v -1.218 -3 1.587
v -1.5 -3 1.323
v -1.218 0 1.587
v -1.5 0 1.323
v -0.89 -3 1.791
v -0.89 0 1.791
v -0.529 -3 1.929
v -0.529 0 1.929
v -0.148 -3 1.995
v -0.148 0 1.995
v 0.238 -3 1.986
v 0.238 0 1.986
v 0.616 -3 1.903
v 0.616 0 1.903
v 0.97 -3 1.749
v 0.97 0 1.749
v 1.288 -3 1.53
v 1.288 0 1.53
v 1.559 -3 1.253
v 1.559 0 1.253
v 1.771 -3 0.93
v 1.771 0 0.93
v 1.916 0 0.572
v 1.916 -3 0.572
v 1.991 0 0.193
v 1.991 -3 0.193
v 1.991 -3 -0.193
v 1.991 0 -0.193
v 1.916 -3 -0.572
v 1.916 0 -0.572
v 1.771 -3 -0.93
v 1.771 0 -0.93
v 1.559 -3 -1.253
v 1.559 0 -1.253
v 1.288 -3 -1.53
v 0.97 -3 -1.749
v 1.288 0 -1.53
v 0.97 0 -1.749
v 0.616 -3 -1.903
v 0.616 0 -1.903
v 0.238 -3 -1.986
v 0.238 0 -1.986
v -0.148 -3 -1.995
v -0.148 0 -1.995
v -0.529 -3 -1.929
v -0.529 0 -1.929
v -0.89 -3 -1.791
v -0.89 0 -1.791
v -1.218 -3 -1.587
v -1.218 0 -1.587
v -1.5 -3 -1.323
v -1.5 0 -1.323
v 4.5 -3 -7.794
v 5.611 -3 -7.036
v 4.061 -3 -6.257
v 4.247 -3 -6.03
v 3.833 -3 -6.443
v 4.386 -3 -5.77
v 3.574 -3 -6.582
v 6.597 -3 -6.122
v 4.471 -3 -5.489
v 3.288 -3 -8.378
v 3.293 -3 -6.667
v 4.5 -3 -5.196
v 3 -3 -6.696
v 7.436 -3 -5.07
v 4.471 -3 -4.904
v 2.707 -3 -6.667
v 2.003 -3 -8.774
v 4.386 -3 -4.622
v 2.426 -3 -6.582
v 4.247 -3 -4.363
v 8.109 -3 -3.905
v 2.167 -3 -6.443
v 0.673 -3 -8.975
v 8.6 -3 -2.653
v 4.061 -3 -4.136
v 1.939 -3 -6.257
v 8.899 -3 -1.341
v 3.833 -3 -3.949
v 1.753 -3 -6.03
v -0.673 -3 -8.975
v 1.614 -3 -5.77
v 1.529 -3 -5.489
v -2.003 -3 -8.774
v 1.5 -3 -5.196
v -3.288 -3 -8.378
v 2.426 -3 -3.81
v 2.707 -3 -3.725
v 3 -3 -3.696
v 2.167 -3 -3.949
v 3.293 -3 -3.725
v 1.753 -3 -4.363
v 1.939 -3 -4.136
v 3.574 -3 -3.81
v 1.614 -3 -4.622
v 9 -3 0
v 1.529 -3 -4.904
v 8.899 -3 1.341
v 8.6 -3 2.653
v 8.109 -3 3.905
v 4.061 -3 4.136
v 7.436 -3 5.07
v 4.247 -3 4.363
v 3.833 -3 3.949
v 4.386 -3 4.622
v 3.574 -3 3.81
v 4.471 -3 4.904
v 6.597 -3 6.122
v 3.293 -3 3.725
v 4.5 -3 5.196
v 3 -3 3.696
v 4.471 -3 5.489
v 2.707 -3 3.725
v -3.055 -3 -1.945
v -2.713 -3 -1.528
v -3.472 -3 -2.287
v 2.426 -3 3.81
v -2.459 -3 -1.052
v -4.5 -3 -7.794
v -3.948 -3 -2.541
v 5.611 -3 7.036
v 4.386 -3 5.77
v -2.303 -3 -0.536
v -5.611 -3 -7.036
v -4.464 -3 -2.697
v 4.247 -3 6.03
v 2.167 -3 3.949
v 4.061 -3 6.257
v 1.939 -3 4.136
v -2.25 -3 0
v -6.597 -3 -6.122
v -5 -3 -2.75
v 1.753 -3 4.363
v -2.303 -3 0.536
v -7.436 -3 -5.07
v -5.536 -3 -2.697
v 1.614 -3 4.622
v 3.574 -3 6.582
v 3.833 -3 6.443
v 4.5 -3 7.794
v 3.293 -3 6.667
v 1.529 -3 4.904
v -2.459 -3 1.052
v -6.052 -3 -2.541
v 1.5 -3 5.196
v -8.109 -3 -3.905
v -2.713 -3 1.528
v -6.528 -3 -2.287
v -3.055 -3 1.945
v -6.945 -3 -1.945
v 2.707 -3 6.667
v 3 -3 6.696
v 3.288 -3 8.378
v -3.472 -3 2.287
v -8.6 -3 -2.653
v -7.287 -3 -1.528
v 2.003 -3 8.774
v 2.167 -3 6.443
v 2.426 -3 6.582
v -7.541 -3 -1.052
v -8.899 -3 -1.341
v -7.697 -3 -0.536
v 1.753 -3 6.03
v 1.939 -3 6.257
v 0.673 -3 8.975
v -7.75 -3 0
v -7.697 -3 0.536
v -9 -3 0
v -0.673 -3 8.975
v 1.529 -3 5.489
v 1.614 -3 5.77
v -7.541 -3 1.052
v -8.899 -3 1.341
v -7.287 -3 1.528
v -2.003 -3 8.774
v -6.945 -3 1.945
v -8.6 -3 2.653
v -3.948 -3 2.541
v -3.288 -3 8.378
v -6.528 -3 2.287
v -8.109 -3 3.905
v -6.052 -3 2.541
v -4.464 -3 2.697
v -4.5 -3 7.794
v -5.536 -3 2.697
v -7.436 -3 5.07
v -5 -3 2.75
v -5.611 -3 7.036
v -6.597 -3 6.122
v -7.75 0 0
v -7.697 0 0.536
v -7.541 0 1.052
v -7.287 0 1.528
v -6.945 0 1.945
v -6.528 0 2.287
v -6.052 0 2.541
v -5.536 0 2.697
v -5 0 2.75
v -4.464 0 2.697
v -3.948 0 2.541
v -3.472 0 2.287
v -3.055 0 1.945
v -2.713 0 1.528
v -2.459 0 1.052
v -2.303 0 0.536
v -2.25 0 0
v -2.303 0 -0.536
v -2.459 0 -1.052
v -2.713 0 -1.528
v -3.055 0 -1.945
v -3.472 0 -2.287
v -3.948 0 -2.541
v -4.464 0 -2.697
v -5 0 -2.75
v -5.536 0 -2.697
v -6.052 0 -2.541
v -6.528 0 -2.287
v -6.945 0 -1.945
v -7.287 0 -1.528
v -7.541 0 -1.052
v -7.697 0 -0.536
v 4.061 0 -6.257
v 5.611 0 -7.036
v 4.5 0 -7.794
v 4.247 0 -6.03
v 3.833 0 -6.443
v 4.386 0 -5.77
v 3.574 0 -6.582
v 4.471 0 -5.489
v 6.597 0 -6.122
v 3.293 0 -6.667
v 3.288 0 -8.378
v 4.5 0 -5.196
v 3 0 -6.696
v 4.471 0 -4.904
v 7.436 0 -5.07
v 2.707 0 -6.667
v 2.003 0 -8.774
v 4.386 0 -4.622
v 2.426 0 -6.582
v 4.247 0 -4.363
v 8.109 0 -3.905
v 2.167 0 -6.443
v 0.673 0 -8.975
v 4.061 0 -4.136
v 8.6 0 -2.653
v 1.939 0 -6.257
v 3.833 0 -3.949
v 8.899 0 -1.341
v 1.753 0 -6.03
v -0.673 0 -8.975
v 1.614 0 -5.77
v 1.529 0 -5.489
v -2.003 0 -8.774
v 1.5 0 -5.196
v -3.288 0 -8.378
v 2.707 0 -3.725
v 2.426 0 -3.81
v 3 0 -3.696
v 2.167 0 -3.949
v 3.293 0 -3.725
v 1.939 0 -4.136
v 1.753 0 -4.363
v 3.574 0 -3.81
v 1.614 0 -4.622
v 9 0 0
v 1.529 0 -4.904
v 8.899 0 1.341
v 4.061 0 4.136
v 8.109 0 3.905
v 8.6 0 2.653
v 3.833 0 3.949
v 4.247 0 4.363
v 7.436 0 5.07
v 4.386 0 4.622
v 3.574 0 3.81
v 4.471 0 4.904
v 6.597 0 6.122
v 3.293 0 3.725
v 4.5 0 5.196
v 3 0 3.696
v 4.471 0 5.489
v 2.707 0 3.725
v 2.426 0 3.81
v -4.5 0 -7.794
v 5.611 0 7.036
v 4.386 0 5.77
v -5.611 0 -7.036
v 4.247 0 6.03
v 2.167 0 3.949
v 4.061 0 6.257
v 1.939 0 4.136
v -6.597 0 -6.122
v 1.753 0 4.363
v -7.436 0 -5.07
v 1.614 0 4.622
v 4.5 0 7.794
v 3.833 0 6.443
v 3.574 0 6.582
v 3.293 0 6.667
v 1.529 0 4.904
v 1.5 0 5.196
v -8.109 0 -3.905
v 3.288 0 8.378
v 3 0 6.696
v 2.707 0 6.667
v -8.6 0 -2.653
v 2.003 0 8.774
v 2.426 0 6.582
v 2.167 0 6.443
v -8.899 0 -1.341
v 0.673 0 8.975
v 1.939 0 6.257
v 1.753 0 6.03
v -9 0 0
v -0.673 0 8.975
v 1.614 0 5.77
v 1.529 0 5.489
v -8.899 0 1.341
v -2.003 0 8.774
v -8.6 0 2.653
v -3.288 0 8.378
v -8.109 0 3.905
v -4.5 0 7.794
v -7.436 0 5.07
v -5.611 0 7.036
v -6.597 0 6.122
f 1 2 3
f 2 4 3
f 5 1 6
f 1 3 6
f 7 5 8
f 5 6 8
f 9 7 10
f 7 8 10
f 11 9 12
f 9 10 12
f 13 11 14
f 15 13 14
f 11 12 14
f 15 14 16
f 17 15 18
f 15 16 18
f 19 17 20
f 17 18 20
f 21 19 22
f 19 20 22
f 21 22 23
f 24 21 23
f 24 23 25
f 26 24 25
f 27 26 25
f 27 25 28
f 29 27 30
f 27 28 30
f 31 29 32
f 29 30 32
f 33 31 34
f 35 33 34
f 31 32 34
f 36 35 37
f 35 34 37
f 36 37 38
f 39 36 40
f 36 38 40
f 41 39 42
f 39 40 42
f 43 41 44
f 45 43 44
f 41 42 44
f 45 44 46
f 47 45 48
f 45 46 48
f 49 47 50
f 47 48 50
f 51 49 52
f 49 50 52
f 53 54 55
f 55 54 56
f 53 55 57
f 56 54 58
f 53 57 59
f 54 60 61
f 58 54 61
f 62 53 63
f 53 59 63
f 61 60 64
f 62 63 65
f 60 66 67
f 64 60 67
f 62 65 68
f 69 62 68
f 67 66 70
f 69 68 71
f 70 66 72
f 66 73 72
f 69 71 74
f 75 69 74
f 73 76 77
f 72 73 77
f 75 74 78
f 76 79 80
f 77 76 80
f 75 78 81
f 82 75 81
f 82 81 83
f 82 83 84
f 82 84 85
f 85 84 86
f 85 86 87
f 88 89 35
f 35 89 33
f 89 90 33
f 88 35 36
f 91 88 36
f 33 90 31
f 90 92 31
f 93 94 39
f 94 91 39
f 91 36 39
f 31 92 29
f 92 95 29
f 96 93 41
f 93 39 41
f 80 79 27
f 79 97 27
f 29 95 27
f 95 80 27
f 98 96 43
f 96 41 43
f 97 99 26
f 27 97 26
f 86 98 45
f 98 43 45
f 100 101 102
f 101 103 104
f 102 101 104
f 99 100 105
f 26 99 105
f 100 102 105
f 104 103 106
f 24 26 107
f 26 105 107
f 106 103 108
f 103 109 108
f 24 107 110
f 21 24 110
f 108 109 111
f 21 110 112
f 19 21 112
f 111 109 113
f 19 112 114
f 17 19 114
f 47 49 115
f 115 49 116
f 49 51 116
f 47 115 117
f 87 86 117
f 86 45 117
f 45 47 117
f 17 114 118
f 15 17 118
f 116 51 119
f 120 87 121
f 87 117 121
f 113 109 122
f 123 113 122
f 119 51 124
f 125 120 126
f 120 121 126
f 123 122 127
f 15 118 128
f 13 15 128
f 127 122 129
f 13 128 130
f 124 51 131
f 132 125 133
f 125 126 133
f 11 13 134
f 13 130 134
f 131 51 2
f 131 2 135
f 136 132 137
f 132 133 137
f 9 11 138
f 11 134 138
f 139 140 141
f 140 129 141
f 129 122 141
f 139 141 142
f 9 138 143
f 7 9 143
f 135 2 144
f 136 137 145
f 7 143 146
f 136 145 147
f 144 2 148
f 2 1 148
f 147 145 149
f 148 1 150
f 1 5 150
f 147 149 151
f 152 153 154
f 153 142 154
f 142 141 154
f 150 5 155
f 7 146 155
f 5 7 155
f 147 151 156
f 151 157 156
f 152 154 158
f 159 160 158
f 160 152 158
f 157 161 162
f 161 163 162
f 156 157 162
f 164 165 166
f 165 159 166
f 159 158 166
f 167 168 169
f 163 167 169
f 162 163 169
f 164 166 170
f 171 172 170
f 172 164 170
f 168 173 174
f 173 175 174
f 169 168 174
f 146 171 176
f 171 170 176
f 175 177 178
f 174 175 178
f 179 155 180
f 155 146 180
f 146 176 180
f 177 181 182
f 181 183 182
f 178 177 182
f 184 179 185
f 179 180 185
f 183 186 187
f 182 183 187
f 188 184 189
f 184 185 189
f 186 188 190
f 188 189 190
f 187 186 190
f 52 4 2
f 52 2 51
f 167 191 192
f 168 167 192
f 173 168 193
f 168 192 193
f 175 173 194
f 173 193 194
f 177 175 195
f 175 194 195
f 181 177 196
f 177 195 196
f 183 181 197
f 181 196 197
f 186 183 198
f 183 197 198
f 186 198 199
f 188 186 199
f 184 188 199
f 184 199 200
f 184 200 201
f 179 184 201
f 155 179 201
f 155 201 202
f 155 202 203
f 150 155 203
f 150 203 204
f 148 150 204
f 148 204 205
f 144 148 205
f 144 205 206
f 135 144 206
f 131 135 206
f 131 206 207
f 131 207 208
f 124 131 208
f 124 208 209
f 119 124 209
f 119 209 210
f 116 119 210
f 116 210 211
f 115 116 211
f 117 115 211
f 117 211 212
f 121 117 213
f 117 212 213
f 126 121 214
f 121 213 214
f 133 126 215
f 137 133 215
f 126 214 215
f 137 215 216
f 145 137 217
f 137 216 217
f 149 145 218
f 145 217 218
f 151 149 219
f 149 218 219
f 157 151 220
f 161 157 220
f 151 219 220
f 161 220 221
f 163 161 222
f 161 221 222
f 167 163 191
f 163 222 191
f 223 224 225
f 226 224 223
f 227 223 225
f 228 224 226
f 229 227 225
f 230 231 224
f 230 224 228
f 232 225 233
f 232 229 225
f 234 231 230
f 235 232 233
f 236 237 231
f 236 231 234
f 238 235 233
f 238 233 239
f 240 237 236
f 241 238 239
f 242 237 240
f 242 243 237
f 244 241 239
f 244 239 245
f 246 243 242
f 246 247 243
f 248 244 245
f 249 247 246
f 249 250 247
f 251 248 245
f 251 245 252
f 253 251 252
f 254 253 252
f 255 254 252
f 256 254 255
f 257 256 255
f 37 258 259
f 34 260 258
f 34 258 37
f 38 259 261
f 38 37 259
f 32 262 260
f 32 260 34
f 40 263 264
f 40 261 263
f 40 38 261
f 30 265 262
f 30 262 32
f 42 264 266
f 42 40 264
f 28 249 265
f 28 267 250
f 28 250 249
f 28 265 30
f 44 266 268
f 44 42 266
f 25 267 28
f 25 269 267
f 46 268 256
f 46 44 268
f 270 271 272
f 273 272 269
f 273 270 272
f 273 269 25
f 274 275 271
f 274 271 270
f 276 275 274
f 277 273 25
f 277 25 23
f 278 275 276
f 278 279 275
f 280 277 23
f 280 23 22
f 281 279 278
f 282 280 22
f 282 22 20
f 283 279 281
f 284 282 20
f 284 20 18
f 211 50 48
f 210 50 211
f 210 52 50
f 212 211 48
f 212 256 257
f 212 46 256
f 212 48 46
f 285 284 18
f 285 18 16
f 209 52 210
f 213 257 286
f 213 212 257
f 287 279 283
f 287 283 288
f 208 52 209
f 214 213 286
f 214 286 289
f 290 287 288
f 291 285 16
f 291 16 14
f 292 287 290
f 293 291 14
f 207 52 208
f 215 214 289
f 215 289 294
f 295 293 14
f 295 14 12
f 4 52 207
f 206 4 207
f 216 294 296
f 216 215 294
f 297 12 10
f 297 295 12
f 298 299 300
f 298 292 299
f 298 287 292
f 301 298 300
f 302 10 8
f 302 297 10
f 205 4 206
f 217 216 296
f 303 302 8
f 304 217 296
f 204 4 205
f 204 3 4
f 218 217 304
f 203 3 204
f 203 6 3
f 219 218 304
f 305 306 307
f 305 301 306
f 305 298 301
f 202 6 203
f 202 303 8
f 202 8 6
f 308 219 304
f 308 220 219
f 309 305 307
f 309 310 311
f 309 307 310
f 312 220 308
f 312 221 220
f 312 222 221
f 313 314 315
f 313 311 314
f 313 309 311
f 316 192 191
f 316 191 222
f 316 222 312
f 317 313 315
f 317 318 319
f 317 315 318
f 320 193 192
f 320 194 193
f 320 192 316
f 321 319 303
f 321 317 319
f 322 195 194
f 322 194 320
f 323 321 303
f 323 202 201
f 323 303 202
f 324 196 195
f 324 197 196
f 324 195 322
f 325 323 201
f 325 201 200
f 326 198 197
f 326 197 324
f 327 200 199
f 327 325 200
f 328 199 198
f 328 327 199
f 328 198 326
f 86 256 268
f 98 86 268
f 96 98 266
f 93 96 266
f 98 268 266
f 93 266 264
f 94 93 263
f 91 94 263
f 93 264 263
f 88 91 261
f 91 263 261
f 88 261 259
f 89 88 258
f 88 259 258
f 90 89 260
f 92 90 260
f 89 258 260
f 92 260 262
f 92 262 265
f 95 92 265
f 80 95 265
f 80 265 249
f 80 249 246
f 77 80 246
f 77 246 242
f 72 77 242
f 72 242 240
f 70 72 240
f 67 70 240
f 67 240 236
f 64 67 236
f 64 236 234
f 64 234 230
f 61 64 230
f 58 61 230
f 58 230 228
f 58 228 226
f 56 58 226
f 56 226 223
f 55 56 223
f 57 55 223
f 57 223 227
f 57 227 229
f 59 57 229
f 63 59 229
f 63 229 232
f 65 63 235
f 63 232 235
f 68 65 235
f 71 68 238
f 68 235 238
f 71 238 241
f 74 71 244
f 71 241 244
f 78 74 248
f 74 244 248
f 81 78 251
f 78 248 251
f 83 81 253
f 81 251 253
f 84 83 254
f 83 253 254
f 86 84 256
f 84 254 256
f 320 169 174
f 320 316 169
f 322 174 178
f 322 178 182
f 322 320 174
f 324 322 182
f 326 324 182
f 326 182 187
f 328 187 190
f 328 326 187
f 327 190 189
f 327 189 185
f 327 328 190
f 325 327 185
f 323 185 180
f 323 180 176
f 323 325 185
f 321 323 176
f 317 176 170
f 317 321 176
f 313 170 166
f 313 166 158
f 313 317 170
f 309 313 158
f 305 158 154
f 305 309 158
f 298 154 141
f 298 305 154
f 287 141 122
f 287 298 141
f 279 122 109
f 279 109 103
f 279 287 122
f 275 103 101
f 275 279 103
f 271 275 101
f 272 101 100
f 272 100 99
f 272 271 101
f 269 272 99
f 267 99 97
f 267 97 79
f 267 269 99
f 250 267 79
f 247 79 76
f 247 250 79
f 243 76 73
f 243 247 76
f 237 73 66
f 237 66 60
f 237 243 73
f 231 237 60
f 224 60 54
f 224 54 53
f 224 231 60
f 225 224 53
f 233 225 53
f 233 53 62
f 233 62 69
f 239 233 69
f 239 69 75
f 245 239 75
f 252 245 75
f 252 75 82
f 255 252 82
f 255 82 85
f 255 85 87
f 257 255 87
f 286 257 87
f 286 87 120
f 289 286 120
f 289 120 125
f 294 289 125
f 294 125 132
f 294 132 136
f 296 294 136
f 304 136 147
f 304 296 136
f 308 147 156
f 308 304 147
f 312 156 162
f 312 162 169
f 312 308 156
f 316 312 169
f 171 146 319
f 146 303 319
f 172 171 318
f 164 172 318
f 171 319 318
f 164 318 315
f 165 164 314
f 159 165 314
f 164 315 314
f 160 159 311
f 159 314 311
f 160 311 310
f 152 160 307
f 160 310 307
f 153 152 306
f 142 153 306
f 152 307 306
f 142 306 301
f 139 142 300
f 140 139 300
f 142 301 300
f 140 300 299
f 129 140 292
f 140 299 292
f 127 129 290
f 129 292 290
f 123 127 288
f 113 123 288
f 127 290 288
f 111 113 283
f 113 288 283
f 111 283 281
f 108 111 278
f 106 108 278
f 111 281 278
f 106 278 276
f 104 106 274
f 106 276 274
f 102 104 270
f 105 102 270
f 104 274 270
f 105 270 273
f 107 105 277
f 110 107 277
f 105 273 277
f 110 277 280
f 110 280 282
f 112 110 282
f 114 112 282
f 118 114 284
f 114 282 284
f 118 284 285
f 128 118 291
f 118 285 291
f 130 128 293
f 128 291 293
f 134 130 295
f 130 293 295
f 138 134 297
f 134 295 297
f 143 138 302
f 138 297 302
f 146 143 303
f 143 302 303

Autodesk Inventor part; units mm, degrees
ref_plane "YZ Plane" through (0, 0, 0) normal (1, 0, 0) x (0, 1, 0)
ref_plane "XZ Plane" through (0, 0, 0) normal (0, 1, 0) x (-1, 0, 0)
ref_plane "XY Plane" through (0, 0, 0) normal (0, 0, 1) x (1, 0, 0)
sketch "Sketch1" plane through (0, 0, 0) normal (0, 1, 0) x (-1, 0, 0)
  circle A0 centre (0, 0) radius 9
  circle A1 centre (5, 0) radius 6 construction
  line L0 (0, 0) -> (-3, -5.1962) construction
  line L1 (0, 0) -> (-3, 5.1962) construction
  line L2 (0, 0) -> (-6.6506, 0) construction
  circle A2 centre (-3, 5.1962) radius 1.5
  circle A3 centre (-3, -5.1962) radius 1.5
  circle A4 centre (5, 0) radius 2.75
  arc A5 (1.5, 1.3229) -> (1.5, -1.3229) centre (0, 0) ccw
  line L3 (1.5, 1.3229) -> (1.5, -1.3229)
  dimension "d0" = 18
  dimension "d1" = 5
  dimension "d2" = 12
  dimension "d3" = 60
  dimension "d4" = 6
  dimension "d5" = 3
  dimension "d6" = 3
  dimension "d7" = 5.5
  dimension "d9" = 4
  dimension "d10" = 1.5
extrude "Extrusion1" add sketch "Sketch1" against normal blind 3
properties part number "Carrier_top"
